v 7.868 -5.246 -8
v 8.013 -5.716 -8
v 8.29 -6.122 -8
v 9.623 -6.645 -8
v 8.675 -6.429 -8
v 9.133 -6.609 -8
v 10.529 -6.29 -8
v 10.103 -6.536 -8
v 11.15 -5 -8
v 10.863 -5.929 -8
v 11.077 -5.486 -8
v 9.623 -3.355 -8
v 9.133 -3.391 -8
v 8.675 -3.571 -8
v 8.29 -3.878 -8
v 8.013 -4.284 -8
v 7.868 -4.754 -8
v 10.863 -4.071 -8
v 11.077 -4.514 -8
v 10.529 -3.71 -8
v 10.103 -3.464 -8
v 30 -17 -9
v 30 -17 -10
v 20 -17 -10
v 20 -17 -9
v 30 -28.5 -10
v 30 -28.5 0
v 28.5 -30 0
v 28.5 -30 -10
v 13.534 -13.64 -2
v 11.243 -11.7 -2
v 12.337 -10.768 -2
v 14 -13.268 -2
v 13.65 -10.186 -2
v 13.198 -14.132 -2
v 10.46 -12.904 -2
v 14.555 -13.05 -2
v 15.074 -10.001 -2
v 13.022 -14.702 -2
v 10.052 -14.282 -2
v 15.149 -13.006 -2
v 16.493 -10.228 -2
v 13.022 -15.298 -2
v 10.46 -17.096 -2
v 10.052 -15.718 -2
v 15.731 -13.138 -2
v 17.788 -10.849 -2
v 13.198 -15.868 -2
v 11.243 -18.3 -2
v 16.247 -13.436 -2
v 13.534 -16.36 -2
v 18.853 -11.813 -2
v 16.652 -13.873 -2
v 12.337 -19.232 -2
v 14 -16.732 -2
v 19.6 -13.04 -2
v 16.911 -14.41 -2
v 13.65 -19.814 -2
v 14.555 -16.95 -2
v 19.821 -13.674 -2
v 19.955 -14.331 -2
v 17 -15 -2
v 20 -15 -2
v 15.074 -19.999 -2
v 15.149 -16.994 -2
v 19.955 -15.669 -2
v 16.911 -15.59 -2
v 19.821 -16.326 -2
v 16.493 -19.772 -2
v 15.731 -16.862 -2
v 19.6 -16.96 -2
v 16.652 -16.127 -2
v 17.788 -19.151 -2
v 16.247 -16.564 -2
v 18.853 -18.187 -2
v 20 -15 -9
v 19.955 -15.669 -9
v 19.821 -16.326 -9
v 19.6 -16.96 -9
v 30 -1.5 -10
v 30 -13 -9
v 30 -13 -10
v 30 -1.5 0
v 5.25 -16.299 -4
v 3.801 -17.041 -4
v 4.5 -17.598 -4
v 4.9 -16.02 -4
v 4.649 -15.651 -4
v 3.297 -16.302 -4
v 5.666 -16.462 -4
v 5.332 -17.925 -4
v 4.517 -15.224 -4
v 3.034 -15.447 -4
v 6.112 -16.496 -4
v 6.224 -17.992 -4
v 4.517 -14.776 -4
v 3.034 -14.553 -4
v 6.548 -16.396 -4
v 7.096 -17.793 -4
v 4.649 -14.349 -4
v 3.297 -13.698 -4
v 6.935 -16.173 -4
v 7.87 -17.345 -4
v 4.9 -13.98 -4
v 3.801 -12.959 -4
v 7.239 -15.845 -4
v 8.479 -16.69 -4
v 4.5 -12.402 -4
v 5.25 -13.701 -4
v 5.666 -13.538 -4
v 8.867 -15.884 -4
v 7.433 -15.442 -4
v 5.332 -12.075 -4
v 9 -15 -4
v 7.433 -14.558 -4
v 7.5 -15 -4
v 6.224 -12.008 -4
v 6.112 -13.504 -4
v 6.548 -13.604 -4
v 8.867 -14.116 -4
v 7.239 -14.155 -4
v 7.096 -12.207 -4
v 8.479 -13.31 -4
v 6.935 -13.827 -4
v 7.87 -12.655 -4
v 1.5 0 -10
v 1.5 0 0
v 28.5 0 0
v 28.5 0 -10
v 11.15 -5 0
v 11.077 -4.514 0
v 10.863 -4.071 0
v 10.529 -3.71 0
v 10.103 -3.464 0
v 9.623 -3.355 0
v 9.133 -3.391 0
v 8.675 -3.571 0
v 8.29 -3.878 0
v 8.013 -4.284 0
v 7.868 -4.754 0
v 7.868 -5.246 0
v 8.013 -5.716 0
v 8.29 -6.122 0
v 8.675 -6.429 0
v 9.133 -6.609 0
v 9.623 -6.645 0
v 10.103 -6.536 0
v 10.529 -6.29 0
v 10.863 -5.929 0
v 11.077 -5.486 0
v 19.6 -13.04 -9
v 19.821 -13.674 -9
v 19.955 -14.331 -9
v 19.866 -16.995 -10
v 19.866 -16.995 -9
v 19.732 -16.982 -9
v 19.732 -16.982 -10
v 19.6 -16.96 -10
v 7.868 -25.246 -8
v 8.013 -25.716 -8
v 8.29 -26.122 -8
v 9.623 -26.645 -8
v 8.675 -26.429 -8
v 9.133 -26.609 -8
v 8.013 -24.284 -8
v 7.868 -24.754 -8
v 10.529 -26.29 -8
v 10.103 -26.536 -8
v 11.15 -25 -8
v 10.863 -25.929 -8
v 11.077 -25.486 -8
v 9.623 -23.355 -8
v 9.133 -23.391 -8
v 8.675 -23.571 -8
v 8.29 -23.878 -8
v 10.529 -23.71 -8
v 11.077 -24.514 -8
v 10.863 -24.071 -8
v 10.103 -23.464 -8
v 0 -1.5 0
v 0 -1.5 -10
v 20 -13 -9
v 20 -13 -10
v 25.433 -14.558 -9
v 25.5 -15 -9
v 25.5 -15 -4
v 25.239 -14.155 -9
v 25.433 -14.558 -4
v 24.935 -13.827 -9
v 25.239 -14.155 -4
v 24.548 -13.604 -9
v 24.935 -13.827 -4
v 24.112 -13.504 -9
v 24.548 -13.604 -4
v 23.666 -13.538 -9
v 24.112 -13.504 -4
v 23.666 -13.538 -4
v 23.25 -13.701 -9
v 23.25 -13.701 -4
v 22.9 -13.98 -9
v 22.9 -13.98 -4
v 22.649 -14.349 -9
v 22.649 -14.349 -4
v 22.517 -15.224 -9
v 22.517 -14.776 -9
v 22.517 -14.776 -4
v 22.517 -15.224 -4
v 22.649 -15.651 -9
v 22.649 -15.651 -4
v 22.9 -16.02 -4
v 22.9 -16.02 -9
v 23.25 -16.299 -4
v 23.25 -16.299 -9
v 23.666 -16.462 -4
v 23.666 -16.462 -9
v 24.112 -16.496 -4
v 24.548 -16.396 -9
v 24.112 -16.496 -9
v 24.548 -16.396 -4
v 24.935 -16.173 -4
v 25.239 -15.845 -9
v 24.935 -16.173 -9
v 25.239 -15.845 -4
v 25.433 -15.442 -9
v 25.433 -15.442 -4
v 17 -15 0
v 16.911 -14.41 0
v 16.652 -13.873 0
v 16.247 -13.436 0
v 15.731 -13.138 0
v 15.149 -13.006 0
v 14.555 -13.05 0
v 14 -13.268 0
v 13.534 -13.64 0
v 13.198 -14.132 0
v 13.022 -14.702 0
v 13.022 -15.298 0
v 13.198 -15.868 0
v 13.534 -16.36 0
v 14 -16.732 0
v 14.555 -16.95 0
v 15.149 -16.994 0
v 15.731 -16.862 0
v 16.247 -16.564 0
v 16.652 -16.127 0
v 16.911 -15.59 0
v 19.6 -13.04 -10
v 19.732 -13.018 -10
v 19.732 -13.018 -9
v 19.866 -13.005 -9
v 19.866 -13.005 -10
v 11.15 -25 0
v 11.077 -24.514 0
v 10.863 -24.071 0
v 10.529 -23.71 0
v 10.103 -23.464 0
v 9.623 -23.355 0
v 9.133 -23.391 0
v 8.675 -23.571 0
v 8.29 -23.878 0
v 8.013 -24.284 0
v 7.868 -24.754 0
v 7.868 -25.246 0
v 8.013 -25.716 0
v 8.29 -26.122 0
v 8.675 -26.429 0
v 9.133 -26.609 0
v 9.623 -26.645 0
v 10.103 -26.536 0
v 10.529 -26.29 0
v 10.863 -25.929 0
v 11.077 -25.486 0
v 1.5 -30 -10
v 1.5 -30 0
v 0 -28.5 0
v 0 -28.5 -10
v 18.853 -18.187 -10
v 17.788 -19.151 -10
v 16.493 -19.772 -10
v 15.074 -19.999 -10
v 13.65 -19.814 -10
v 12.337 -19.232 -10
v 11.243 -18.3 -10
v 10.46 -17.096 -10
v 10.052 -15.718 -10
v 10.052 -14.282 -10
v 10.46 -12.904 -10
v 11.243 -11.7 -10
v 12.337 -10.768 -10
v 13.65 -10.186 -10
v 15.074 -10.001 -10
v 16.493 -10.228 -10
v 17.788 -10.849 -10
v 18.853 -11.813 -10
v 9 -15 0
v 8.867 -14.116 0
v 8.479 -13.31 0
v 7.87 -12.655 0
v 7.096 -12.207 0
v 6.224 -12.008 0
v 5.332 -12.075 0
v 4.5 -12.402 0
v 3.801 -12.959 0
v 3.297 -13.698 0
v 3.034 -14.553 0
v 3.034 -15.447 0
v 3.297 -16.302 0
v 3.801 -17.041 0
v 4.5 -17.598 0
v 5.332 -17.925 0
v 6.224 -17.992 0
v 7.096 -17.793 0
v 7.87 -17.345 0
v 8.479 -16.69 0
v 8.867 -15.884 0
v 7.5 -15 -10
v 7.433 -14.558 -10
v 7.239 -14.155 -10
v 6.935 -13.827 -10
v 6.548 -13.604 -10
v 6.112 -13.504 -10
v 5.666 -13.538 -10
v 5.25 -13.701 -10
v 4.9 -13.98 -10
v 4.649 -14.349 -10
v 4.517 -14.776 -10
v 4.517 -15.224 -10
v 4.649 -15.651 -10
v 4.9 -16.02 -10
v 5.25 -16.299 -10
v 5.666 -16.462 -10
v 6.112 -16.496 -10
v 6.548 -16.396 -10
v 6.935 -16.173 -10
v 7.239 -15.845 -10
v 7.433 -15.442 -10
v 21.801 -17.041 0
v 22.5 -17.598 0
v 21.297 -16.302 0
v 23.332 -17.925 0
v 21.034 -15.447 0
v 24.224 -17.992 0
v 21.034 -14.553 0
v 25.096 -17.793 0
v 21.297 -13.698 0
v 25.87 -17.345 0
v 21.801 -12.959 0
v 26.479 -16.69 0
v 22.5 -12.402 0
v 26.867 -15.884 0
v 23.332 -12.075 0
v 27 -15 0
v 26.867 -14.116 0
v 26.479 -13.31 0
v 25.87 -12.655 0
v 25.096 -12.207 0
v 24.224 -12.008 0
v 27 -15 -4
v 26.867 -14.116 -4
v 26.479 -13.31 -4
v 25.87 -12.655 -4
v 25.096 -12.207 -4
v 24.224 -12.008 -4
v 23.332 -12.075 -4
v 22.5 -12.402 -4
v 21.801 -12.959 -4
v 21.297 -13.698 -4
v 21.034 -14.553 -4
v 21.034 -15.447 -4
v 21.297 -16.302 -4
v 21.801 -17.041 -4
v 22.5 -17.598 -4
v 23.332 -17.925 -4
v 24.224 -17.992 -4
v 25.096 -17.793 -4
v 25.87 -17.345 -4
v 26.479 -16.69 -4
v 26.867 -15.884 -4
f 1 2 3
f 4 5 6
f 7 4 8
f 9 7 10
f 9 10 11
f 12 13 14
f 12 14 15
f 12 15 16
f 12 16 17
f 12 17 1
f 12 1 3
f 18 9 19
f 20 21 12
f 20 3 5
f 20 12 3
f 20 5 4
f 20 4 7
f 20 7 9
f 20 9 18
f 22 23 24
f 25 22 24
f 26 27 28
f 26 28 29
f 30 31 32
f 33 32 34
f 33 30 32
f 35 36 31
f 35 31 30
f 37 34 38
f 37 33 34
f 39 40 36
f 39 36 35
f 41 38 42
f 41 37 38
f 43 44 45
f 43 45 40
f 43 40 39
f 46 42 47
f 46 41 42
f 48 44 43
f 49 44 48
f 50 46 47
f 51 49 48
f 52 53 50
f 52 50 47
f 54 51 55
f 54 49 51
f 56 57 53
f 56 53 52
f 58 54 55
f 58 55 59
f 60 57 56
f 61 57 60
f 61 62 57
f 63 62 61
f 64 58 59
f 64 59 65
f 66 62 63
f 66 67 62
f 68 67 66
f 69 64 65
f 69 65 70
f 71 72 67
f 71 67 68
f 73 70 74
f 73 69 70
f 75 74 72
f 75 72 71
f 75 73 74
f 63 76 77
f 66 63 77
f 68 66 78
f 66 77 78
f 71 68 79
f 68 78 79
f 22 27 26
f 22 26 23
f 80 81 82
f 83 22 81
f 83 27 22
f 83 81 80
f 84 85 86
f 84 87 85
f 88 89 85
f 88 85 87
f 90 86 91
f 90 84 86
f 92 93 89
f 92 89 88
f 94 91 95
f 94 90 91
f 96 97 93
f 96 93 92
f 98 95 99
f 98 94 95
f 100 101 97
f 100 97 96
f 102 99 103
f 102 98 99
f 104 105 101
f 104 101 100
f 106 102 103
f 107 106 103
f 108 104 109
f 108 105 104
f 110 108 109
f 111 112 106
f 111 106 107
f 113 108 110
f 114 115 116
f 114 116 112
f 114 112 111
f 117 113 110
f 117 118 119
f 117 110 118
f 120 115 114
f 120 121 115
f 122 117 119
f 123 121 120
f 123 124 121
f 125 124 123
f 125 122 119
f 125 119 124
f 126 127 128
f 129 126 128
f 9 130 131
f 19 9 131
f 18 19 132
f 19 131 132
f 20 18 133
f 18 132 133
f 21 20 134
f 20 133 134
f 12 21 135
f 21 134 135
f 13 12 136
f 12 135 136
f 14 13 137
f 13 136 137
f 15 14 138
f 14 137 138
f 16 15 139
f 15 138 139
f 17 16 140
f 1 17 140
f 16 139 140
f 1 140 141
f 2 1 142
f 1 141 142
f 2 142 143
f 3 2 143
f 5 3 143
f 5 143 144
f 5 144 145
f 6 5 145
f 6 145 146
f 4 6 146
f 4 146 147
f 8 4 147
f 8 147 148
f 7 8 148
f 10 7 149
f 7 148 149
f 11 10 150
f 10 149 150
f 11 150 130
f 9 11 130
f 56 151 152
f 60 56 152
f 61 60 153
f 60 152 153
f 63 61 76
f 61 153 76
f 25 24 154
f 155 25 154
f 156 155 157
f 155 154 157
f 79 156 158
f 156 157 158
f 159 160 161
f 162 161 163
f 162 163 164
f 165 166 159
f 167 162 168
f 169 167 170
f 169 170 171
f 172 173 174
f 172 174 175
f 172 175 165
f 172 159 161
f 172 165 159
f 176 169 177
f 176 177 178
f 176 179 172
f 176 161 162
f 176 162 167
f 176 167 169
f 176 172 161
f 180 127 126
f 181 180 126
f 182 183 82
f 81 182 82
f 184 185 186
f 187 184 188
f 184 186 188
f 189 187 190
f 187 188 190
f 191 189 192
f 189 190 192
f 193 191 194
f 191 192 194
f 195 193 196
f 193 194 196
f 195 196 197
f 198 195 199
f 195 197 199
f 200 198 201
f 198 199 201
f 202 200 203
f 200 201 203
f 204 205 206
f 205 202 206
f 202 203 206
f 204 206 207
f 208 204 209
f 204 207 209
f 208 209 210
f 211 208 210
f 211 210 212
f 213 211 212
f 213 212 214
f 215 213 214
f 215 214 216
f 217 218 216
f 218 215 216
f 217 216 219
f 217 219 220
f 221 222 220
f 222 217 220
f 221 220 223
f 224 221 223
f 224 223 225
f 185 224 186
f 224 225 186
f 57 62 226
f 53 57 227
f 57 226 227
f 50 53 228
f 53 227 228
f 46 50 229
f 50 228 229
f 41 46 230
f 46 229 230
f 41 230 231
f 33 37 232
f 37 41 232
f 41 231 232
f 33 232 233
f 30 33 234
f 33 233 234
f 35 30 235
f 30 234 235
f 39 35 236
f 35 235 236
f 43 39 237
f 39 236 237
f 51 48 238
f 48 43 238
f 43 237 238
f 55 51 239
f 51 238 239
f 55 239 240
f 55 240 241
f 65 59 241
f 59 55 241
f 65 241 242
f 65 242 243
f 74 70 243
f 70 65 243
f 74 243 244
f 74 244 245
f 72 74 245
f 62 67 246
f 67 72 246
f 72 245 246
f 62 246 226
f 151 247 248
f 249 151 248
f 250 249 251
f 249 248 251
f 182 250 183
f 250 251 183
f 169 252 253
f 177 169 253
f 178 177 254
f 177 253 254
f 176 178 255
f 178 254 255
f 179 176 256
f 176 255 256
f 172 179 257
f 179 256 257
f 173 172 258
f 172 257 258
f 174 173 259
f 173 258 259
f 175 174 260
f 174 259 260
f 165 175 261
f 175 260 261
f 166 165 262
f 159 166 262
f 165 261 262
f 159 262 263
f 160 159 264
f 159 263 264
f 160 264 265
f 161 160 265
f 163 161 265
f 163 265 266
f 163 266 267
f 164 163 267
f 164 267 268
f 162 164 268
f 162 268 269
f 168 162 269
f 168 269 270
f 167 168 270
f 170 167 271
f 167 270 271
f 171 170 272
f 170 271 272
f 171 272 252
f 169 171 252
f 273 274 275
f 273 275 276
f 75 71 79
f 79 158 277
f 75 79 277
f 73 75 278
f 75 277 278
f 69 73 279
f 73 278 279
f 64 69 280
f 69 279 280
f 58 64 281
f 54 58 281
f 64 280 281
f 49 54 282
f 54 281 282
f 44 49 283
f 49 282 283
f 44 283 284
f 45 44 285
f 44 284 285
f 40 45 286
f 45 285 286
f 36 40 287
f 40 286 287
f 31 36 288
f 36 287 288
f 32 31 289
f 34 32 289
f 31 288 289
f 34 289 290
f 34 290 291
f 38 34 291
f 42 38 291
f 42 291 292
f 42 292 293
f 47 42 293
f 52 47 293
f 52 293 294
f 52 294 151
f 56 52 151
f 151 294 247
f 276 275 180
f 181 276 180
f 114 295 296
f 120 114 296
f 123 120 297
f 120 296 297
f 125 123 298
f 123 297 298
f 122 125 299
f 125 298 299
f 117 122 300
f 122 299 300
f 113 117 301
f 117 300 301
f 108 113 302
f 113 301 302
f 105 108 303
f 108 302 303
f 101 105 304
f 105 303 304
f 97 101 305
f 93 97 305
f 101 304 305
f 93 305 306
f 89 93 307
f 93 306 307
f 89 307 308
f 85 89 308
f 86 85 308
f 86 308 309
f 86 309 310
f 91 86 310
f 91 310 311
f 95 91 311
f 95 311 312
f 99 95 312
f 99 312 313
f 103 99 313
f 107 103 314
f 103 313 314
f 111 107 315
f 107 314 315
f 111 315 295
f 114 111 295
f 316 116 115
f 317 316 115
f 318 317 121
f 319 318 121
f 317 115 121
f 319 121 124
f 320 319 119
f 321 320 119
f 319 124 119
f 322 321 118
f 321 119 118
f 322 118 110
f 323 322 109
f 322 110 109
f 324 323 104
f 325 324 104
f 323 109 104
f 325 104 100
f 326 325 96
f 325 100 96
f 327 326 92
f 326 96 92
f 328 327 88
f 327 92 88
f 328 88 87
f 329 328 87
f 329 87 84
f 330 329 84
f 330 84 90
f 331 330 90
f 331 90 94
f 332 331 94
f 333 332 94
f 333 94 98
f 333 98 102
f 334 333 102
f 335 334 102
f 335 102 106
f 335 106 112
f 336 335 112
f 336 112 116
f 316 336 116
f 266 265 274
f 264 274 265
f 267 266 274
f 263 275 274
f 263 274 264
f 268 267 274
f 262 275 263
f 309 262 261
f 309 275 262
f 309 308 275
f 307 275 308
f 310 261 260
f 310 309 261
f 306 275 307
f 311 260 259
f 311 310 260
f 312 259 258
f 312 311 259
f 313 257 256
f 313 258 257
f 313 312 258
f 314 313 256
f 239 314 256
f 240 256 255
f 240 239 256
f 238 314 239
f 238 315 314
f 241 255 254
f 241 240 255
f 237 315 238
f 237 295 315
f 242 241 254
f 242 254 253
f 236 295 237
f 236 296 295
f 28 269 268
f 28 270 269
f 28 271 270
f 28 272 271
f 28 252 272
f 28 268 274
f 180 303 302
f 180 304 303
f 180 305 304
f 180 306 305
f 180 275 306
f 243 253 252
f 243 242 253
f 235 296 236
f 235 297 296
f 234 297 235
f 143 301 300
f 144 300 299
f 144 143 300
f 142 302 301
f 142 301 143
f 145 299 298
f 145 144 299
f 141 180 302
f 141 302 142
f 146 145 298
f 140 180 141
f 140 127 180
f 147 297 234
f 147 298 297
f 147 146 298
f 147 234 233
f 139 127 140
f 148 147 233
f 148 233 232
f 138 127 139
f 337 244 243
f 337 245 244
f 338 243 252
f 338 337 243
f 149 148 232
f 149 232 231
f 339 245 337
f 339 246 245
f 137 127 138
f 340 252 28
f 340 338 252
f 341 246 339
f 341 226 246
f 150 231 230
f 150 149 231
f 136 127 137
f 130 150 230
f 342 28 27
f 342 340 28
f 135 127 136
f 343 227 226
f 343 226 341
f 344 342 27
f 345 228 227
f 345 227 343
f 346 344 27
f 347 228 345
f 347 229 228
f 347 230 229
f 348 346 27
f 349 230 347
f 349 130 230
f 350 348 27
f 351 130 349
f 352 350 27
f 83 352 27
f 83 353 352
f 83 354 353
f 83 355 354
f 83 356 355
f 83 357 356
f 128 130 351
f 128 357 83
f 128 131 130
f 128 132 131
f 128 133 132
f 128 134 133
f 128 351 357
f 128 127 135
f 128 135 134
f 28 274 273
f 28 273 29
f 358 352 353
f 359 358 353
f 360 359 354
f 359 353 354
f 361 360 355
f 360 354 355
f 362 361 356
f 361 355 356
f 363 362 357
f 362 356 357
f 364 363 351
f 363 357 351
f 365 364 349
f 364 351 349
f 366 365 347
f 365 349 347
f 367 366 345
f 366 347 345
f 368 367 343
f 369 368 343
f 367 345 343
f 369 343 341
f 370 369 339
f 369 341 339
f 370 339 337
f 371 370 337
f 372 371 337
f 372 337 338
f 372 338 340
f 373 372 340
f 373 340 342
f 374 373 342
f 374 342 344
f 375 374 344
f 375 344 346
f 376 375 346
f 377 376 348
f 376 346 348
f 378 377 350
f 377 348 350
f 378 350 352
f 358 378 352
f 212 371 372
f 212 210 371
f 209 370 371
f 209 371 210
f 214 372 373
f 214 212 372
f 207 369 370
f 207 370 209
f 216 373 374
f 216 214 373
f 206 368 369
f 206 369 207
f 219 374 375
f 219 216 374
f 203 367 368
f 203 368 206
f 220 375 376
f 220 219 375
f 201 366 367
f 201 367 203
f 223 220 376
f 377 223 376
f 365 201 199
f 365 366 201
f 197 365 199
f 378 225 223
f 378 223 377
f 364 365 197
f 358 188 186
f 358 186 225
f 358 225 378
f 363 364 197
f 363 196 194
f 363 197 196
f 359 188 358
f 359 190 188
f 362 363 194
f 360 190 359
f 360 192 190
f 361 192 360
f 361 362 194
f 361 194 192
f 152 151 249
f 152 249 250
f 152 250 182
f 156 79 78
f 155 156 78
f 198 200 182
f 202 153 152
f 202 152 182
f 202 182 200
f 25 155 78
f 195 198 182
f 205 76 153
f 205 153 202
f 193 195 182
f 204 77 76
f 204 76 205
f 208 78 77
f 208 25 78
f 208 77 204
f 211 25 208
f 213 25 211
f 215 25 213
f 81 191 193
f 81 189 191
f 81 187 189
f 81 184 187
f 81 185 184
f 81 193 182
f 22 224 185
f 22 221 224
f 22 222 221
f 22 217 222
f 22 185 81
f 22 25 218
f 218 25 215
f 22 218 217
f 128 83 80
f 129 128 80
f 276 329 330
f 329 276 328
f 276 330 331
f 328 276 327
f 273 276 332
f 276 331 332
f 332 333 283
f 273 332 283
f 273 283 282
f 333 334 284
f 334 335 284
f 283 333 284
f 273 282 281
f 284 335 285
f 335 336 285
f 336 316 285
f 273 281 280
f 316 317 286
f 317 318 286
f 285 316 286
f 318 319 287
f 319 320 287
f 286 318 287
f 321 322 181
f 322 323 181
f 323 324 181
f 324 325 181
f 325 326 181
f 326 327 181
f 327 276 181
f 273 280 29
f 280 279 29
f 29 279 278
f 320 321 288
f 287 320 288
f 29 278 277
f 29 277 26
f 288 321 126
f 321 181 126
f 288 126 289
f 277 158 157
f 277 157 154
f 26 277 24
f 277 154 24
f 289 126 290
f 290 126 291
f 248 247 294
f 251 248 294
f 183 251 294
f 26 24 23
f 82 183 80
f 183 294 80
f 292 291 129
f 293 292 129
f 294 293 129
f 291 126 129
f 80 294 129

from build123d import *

# Parameters (mm, degrees)
F0_W     = 30
F0_H     = 30
F0_R     = 1.65
F0_R_2   = 3
F0_R_3   = 2
F0_R_4   = 1.5
F1_DEPTH = 10
F2_DEPTH = 12
F3_SIZE  = 1.5
F4_DEPTH = 4
F5_DEPTH = 8
F6_R     = 2
F7_DEPTH = 8
F6_R_2   = 1.5
F8_DEPTH = 1


# Not quite as in the source:
# - a feature names something its author has since deleted; it is built from what else it names


with BuildPart() as f1:
    # F0 (on Top) → F1 (new body)
    with BuildSketch(Plane.XY):
        with Locations((15, -15)):
            Rectangle(F0_W, F0_H)
        with Locations((9.5, -25)):
            Circle(F0_R, mode=Mode.SUBTRACT)
        with Locations((15, -24)):
            Circle(F0_R_2, mode=Mode.SUBTRACT)
        with Locations((6, -15)):
            Circle(F0_R_2, mode=Mode.SUBTRACT)
        with Locations((9.5, -5)):
            Circle(F0_R, mode=Mode.SUBTRACT)
        with Locations((15, -15)):
            Circle(F0_R_3, mode=Mode.SUBTRACT)
        with Locations((24, -15)):
            Circle(F0_R_2, mode=Mode.SUBTRACT)
        with Locations((15, -6)):
            Circle(F0_R_2, mode=Mode.SUBTRACT)
        with Locations((15, -15)):
            Circle(F0_R_3)
        with Locations((15, -6)):
            Circle(F0_R_2)
        with Locations((15, -6)):
            Circle(F0_R_4, mode=Mode.SUBTRACT)
        with Locations((15, -24)):
            Circle(F0_R_2)
        with Locations((15, -24)):
            Circle(F0_R_4, mode=Mode.SUBTRACT)
        with Locations((9.5, -5)):
            Circle(F0_R)
        with Locations((9.5, -25)):
            Circle(F0_R)
        with Locations((24, -15)):
            Circle(F0_R_2)
        with Locations((24, -15)):
            Circle(F0_R_4, mode=Mode.SUBTRACT)
        with Locations((6, -15)):
            Circle(F0_R_2)
        with Locations((6, -15)):
            Circle(F0_R_4, mode=Mode.SUBTRACT)
        with Locations((15, -24)):
            Circle(F0_R_4)
        with Locations((15, -6)):
            Circle(F0_R_4)
    extrude(amount=-F1_DEPTH)

    # F0 (on Top) → F2 (cut)
    with BuildSketch(Plane.XY):
        with Locations((15, -15)):
            Circle(F0_R_3)
    extrude(amount=-F2_DEPTH, mode=Mode.SUBTRACT)

    # F3
    f3_edges = [f1.edges().sort_by_distance(p)[0] for p in [
        (30, -30, -5),
        (0, -30, -5),
        (0, 0, -5),
        (30, 0, -5),
    ]]
    chamfer(f3_edges, length=F3_SIZE)

    # F0 (on Top) → F4 (cut)
    with BuildSketch(Plane.XY):
        with Locations((6, -15)):
            Circle(F0_R_2)
        with Locations((6, -15)):
            Circle(F0_R_4, mode=Mode.SUBTRACT)
        with Locations((24, -15)):
            Circle(F0_R_2)
        with Locations((24, -15)):
            Circle(F0_R_4, mode=Mode.SUBTRACT)
    extrude(amount=-F4_DEPTH, mode=Mode.SUBTRACT)

    # F0 (on Top) → F5 (cut)
    with BuildSketch(Plane.XY):
        with Locations((9.5, -5)):
            Circle(F0_R)
        with Locations((9.5, -25)):
            Circle(F0_R)
    extrude(amount=-F5_DEPTH, mode=Mode.SUBTRACT)

    # F6 (on face) → F7 (cut)
    with BuildSketch(Plane(origin=(0, 0, -10), x_dir=(1, 0, 0), z_dir=(0, 0, -1))):
        with BuildLine():
            ThreePointArc((19.6, 13.0404082058), (18, 15), (19.6, 16.9595917942))
            ThreePointArc((19.6, 16.9595917942), (10, 15), (19.6, 13.0404082058))
        make_face()
        with Locations((15, 15)):
            Circle(F6_R, mode=Mode.SUBTRACT)
        with BuildLine():
            ThreePointArc((19.6, 13.0404082058), (19.8989794856, 14), (20, 15))
            ThreePointArc((20, 15), (19.8989794856, 16), (19.6, 16.9595917942))
            ThreePointArc((19.6, 16.9595917942), (18, 15), (19.6, 13.0404082058))
        make_face()
    extrude(amount=-F7_DEPTH, mode=Mode.SUBTRACT)

    # F6 (on face) → F8 (cut)
    with BuildSketch(Plane(origin=(0, 0, -10), x_dir=(1, 0, 0), z_dir=(0, 0, -1))):
        with BuildLine():
            ThreePointArc((19.6, 16.9595917942), (19.8989794856, 16), (20, 15))
            ThreePointArc((20, 15), (19.8989794856, 14), (19.6, 13.0404082058))
            ThreePointArc((19.6, 13.0404082058), (19.798982076, 13.010127694), (20, 13))
            Line((20, 13), (30, 13))
            Line((30, 13), (30, 17))
            Line((30, 17), (20, 17))
            ThreePointArc((20, 17), (19.798982076, 16.989872306), (19.6, 16.9595917942))
        make_face()
        with Locations((24, 15)):
            Circle(F6_R_2, mode=Mode.SUBTRACT)
    extrude(amount=-F8_DEPTH, mode=Mode.SUBTRACT)


solid = f1.part
